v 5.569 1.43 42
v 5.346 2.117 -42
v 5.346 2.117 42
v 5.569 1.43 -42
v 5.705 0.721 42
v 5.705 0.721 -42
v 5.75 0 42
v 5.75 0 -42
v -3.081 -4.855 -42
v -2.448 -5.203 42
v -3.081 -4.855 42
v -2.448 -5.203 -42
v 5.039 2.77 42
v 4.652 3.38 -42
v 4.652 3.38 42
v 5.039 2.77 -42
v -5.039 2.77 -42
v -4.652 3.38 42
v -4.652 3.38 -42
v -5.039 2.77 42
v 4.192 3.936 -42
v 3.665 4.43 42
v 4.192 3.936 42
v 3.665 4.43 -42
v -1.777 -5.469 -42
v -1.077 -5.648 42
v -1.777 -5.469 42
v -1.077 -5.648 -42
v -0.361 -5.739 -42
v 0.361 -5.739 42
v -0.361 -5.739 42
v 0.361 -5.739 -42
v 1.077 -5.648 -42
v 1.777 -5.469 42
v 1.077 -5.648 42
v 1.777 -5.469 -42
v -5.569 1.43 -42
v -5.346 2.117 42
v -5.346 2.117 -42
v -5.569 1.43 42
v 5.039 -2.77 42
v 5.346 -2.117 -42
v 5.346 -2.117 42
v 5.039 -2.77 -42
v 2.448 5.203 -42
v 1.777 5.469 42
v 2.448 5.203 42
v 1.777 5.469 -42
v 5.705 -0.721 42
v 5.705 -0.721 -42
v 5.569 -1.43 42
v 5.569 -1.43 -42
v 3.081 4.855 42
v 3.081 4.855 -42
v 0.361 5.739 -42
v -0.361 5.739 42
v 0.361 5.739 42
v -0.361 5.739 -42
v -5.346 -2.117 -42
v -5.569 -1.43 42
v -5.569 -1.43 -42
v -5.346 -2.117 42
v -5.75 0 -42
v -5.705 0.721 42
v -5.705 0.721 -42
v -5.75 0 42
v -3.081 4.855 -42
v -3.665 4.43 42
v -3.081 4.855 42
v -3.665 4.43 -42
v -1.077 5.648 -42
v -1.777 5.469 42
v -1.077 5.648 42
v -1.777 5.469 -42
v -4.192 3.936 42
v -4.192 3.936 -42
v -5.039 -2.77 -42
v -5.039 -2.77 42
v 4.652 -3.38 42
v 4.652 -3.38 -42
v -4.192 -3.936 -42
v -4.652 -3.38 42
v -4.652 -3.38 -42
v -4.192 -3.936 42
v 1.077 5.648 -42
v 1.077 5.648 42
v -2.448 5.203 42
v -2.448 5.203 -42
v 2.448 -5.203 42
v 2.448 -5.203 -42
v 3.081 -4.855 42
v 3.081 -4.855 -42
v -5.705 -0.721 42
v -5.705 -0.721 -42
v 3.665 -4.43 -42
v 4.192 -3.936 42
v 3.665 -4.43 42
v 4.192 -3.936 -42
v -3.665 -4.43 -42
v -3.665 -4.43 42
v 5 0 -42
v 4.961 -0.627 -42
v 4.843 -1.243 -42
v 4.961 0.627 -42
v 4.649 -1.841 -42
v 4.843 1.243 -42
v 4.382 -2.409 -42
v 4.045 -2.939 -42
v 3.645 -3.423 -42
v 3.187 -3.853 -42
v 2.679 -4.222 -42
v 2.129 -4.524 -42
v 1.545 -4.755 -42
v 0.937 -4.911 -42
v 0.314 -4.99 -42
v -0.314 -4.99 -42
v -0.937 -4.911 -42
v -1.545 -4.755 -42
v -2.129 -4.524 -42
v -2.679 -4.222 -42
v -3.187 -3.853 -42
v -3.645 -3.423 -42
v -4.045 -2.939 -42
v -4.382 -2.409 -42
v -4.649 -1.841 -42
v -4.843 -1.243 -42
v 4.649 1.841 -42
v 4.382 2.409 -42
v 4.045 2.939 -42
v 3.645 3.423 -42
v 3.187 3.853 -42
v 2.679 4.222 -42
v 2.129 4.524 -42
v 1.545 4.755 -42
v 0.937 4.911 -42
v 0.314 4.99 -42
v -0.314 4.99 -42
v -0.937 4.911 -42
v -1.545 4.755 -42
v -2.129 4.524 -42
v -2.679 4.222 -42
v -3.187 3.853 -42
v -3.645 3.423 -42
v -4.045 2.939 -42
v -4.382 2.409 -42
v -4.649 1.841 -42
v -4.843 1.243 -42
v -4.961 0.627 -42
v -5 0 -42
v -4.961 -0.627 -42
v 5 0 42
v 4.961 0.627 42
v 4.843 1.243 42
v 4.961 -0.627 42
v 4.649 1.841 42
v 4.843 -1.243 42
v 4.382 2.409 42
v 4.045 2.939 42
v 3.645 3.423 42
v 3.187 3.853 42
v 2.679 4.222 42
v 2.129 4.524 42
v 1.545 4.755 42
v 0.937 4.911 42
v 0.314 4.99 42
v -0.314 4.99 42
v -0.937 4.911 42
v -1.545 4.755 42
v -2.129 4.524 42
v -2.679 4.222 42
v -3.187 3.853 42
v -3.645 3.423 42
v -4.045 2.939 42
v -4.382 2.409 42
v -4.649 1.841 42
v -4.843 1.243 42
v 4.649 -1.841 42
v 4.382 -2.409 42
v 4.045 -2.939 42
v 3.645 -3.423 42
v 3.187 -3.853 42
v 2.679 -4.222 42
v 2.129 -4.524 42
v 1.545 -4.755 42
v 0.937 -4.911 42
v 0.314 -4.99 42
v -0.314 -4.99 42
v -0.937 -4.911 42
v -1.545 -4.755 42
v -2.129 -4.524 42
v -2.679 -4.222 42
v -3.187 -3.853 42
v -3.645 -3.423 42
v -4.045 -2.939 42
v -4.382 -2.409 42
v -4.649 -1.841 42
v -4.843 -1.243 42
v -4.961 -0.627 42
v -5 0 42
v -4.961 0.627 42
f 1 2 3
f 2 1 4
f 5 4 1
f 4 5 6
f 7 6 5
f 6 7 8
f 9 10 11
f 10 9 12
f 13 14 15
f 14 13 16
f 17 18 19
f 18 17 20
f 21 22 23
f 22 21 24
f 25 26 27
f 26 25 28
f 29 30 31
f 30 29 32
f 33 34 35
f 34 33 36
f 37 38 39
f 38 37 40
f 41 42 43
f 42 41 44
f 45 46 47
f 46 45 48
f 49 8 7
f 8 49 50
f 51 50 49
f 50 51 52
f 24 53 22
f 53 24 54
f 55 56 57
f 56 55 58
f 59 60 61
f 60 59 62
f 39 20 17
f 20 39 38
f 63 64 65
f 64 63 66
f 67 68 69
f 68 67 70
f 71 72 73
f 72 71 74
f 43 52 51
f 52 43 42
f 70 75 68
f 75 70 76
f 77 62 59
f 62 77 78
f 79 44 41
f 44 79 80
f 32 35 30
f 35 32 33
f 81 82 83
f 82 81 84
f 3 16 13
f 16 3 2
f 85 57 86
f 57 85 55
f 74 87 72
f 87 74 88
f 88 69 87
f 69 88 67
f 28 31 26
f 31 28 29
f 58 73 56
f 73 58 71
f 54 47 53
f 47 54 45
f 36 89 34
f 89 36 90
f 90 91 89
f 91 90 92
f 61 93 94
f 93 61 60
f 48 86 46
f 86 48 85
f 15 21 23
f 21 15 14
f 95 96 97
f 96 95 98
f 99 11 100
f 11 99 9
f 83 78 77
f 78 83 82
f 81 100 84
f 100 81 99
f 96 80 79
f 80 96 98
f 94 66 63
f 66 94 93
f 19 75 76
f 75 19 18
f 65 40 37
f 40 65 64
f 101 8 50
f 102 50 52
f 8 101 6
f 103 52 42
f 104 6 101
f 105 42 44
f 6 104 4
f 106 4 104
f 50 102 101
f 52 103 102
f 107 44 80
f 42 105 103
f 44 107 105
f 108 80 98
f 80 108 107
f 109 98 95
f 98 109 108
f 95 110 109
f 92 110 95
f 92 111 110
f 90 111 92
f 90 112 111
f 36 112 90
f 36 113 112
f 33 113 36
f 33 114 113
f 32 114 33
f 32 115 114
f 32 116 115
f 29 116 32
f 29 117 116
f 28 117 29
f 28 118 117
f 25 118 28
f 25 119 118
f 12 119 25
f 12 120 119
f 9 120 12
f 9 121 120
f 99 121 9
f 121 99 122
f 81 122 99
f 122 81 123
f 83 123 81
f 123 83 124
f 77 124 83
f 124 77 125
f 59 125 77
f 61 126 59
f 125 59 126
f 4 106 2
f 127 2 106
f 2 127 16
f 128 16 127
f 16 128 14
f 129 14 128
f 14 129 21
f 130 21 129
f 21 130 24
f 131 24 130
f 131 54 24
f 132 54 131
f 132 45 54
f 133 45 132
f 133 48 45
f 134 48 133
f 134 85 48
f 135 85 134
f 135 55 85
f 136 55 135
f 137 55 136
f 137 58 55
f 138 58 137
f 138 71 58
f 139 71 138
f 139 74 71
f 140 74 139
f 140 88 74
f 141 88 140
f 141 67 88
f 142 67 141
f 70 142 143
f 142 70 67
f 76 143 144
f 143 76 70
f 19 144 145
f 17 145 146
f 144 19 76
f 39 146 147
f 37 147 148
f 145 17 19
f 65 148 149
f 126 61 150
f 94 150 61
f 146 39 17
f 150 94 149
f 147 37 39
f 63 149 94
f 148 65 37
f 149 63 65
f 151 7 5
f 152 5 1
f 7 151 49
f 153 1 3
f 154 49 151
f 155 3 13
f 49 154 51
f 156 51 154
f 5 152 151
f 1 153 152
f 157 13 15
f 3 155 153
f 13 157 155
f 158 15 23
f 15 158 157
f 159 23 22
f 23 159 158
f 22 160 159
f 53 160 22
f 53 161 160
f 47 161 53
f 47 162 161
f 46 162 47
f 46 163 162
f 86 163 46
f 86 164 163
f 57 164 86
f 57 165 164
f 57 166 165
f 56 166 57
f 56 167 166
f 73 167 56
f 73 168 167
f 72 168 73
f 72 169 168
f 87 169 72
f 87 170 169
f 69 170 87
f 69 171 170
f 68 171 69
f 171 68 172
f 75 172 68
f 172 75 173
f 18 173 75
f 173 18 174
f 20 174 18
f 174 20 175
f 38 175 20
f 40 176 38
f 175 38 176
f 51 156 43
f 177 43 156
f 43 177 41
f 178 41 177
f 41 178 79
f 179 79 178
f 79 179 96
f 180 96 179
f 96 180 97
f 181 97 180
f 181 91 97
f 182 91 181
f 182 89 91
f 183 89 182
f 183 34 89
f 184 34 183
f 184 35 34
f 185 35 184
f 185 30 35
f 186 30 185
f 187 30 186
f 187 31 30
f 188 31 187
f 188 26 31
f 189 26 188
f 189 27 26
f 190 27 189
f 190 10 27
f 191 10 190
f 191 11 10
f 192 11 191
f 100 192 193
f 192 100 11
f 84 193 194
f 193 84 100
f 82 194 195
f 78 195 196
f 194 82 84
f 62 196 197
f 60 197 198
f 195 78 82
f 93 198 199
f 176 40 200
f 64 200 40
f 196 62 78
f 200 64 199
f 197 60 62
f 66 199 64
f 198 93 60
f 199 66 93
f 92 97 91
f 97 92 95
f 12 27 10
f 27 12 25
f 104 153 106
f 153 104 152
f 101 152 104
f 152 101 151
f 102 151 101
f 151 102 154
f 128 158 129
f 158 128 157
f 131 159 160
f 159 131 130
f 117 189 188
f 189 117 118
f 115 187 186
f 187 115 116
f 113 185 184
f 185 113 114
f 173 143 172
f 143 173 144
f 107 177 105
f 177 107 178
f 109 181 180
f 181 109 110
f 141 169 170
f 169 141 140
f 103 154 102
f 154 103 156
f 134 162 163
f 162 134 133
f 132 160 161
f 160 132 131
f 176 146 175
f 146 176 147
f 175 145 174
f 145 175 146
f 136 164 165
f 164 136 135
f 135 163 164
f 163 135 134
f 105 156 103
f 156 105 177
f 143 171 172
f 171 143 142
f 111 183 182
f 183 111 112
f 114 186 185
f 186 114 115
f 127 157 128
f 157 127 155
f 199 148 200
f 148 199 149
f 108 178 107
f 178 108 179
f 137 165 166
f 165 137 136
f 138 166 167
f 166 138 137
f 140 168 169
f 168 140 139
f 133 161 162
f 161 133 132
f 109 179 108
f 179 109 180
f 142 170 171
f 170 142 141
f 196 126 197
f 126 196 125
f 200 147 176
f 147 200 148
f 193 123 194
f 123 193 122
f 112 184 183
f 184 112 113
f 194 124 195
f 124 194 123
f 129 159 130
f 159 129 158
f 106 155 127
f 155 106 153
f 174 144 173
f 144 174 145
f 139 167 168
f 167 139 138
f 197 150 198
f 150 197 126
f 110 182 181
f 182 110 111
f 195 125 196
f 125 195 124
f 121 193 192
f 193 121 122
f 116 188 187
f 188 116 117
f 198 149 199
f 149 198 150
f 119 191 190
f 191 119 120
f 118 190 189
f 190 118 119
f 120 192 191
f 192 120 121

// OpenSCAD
$fn = 50;


difference() {
	union() {
		translate(v = [0, 0, -42.0000000000]) {
			cylinder(h = 84, r = 5.7500000000);
		}
	}
	union() {
		translate(v = [0, 0, -100.0000000000]) {
			cylinder(h = 200, r = 5.0000000000);
		}
	}
}
